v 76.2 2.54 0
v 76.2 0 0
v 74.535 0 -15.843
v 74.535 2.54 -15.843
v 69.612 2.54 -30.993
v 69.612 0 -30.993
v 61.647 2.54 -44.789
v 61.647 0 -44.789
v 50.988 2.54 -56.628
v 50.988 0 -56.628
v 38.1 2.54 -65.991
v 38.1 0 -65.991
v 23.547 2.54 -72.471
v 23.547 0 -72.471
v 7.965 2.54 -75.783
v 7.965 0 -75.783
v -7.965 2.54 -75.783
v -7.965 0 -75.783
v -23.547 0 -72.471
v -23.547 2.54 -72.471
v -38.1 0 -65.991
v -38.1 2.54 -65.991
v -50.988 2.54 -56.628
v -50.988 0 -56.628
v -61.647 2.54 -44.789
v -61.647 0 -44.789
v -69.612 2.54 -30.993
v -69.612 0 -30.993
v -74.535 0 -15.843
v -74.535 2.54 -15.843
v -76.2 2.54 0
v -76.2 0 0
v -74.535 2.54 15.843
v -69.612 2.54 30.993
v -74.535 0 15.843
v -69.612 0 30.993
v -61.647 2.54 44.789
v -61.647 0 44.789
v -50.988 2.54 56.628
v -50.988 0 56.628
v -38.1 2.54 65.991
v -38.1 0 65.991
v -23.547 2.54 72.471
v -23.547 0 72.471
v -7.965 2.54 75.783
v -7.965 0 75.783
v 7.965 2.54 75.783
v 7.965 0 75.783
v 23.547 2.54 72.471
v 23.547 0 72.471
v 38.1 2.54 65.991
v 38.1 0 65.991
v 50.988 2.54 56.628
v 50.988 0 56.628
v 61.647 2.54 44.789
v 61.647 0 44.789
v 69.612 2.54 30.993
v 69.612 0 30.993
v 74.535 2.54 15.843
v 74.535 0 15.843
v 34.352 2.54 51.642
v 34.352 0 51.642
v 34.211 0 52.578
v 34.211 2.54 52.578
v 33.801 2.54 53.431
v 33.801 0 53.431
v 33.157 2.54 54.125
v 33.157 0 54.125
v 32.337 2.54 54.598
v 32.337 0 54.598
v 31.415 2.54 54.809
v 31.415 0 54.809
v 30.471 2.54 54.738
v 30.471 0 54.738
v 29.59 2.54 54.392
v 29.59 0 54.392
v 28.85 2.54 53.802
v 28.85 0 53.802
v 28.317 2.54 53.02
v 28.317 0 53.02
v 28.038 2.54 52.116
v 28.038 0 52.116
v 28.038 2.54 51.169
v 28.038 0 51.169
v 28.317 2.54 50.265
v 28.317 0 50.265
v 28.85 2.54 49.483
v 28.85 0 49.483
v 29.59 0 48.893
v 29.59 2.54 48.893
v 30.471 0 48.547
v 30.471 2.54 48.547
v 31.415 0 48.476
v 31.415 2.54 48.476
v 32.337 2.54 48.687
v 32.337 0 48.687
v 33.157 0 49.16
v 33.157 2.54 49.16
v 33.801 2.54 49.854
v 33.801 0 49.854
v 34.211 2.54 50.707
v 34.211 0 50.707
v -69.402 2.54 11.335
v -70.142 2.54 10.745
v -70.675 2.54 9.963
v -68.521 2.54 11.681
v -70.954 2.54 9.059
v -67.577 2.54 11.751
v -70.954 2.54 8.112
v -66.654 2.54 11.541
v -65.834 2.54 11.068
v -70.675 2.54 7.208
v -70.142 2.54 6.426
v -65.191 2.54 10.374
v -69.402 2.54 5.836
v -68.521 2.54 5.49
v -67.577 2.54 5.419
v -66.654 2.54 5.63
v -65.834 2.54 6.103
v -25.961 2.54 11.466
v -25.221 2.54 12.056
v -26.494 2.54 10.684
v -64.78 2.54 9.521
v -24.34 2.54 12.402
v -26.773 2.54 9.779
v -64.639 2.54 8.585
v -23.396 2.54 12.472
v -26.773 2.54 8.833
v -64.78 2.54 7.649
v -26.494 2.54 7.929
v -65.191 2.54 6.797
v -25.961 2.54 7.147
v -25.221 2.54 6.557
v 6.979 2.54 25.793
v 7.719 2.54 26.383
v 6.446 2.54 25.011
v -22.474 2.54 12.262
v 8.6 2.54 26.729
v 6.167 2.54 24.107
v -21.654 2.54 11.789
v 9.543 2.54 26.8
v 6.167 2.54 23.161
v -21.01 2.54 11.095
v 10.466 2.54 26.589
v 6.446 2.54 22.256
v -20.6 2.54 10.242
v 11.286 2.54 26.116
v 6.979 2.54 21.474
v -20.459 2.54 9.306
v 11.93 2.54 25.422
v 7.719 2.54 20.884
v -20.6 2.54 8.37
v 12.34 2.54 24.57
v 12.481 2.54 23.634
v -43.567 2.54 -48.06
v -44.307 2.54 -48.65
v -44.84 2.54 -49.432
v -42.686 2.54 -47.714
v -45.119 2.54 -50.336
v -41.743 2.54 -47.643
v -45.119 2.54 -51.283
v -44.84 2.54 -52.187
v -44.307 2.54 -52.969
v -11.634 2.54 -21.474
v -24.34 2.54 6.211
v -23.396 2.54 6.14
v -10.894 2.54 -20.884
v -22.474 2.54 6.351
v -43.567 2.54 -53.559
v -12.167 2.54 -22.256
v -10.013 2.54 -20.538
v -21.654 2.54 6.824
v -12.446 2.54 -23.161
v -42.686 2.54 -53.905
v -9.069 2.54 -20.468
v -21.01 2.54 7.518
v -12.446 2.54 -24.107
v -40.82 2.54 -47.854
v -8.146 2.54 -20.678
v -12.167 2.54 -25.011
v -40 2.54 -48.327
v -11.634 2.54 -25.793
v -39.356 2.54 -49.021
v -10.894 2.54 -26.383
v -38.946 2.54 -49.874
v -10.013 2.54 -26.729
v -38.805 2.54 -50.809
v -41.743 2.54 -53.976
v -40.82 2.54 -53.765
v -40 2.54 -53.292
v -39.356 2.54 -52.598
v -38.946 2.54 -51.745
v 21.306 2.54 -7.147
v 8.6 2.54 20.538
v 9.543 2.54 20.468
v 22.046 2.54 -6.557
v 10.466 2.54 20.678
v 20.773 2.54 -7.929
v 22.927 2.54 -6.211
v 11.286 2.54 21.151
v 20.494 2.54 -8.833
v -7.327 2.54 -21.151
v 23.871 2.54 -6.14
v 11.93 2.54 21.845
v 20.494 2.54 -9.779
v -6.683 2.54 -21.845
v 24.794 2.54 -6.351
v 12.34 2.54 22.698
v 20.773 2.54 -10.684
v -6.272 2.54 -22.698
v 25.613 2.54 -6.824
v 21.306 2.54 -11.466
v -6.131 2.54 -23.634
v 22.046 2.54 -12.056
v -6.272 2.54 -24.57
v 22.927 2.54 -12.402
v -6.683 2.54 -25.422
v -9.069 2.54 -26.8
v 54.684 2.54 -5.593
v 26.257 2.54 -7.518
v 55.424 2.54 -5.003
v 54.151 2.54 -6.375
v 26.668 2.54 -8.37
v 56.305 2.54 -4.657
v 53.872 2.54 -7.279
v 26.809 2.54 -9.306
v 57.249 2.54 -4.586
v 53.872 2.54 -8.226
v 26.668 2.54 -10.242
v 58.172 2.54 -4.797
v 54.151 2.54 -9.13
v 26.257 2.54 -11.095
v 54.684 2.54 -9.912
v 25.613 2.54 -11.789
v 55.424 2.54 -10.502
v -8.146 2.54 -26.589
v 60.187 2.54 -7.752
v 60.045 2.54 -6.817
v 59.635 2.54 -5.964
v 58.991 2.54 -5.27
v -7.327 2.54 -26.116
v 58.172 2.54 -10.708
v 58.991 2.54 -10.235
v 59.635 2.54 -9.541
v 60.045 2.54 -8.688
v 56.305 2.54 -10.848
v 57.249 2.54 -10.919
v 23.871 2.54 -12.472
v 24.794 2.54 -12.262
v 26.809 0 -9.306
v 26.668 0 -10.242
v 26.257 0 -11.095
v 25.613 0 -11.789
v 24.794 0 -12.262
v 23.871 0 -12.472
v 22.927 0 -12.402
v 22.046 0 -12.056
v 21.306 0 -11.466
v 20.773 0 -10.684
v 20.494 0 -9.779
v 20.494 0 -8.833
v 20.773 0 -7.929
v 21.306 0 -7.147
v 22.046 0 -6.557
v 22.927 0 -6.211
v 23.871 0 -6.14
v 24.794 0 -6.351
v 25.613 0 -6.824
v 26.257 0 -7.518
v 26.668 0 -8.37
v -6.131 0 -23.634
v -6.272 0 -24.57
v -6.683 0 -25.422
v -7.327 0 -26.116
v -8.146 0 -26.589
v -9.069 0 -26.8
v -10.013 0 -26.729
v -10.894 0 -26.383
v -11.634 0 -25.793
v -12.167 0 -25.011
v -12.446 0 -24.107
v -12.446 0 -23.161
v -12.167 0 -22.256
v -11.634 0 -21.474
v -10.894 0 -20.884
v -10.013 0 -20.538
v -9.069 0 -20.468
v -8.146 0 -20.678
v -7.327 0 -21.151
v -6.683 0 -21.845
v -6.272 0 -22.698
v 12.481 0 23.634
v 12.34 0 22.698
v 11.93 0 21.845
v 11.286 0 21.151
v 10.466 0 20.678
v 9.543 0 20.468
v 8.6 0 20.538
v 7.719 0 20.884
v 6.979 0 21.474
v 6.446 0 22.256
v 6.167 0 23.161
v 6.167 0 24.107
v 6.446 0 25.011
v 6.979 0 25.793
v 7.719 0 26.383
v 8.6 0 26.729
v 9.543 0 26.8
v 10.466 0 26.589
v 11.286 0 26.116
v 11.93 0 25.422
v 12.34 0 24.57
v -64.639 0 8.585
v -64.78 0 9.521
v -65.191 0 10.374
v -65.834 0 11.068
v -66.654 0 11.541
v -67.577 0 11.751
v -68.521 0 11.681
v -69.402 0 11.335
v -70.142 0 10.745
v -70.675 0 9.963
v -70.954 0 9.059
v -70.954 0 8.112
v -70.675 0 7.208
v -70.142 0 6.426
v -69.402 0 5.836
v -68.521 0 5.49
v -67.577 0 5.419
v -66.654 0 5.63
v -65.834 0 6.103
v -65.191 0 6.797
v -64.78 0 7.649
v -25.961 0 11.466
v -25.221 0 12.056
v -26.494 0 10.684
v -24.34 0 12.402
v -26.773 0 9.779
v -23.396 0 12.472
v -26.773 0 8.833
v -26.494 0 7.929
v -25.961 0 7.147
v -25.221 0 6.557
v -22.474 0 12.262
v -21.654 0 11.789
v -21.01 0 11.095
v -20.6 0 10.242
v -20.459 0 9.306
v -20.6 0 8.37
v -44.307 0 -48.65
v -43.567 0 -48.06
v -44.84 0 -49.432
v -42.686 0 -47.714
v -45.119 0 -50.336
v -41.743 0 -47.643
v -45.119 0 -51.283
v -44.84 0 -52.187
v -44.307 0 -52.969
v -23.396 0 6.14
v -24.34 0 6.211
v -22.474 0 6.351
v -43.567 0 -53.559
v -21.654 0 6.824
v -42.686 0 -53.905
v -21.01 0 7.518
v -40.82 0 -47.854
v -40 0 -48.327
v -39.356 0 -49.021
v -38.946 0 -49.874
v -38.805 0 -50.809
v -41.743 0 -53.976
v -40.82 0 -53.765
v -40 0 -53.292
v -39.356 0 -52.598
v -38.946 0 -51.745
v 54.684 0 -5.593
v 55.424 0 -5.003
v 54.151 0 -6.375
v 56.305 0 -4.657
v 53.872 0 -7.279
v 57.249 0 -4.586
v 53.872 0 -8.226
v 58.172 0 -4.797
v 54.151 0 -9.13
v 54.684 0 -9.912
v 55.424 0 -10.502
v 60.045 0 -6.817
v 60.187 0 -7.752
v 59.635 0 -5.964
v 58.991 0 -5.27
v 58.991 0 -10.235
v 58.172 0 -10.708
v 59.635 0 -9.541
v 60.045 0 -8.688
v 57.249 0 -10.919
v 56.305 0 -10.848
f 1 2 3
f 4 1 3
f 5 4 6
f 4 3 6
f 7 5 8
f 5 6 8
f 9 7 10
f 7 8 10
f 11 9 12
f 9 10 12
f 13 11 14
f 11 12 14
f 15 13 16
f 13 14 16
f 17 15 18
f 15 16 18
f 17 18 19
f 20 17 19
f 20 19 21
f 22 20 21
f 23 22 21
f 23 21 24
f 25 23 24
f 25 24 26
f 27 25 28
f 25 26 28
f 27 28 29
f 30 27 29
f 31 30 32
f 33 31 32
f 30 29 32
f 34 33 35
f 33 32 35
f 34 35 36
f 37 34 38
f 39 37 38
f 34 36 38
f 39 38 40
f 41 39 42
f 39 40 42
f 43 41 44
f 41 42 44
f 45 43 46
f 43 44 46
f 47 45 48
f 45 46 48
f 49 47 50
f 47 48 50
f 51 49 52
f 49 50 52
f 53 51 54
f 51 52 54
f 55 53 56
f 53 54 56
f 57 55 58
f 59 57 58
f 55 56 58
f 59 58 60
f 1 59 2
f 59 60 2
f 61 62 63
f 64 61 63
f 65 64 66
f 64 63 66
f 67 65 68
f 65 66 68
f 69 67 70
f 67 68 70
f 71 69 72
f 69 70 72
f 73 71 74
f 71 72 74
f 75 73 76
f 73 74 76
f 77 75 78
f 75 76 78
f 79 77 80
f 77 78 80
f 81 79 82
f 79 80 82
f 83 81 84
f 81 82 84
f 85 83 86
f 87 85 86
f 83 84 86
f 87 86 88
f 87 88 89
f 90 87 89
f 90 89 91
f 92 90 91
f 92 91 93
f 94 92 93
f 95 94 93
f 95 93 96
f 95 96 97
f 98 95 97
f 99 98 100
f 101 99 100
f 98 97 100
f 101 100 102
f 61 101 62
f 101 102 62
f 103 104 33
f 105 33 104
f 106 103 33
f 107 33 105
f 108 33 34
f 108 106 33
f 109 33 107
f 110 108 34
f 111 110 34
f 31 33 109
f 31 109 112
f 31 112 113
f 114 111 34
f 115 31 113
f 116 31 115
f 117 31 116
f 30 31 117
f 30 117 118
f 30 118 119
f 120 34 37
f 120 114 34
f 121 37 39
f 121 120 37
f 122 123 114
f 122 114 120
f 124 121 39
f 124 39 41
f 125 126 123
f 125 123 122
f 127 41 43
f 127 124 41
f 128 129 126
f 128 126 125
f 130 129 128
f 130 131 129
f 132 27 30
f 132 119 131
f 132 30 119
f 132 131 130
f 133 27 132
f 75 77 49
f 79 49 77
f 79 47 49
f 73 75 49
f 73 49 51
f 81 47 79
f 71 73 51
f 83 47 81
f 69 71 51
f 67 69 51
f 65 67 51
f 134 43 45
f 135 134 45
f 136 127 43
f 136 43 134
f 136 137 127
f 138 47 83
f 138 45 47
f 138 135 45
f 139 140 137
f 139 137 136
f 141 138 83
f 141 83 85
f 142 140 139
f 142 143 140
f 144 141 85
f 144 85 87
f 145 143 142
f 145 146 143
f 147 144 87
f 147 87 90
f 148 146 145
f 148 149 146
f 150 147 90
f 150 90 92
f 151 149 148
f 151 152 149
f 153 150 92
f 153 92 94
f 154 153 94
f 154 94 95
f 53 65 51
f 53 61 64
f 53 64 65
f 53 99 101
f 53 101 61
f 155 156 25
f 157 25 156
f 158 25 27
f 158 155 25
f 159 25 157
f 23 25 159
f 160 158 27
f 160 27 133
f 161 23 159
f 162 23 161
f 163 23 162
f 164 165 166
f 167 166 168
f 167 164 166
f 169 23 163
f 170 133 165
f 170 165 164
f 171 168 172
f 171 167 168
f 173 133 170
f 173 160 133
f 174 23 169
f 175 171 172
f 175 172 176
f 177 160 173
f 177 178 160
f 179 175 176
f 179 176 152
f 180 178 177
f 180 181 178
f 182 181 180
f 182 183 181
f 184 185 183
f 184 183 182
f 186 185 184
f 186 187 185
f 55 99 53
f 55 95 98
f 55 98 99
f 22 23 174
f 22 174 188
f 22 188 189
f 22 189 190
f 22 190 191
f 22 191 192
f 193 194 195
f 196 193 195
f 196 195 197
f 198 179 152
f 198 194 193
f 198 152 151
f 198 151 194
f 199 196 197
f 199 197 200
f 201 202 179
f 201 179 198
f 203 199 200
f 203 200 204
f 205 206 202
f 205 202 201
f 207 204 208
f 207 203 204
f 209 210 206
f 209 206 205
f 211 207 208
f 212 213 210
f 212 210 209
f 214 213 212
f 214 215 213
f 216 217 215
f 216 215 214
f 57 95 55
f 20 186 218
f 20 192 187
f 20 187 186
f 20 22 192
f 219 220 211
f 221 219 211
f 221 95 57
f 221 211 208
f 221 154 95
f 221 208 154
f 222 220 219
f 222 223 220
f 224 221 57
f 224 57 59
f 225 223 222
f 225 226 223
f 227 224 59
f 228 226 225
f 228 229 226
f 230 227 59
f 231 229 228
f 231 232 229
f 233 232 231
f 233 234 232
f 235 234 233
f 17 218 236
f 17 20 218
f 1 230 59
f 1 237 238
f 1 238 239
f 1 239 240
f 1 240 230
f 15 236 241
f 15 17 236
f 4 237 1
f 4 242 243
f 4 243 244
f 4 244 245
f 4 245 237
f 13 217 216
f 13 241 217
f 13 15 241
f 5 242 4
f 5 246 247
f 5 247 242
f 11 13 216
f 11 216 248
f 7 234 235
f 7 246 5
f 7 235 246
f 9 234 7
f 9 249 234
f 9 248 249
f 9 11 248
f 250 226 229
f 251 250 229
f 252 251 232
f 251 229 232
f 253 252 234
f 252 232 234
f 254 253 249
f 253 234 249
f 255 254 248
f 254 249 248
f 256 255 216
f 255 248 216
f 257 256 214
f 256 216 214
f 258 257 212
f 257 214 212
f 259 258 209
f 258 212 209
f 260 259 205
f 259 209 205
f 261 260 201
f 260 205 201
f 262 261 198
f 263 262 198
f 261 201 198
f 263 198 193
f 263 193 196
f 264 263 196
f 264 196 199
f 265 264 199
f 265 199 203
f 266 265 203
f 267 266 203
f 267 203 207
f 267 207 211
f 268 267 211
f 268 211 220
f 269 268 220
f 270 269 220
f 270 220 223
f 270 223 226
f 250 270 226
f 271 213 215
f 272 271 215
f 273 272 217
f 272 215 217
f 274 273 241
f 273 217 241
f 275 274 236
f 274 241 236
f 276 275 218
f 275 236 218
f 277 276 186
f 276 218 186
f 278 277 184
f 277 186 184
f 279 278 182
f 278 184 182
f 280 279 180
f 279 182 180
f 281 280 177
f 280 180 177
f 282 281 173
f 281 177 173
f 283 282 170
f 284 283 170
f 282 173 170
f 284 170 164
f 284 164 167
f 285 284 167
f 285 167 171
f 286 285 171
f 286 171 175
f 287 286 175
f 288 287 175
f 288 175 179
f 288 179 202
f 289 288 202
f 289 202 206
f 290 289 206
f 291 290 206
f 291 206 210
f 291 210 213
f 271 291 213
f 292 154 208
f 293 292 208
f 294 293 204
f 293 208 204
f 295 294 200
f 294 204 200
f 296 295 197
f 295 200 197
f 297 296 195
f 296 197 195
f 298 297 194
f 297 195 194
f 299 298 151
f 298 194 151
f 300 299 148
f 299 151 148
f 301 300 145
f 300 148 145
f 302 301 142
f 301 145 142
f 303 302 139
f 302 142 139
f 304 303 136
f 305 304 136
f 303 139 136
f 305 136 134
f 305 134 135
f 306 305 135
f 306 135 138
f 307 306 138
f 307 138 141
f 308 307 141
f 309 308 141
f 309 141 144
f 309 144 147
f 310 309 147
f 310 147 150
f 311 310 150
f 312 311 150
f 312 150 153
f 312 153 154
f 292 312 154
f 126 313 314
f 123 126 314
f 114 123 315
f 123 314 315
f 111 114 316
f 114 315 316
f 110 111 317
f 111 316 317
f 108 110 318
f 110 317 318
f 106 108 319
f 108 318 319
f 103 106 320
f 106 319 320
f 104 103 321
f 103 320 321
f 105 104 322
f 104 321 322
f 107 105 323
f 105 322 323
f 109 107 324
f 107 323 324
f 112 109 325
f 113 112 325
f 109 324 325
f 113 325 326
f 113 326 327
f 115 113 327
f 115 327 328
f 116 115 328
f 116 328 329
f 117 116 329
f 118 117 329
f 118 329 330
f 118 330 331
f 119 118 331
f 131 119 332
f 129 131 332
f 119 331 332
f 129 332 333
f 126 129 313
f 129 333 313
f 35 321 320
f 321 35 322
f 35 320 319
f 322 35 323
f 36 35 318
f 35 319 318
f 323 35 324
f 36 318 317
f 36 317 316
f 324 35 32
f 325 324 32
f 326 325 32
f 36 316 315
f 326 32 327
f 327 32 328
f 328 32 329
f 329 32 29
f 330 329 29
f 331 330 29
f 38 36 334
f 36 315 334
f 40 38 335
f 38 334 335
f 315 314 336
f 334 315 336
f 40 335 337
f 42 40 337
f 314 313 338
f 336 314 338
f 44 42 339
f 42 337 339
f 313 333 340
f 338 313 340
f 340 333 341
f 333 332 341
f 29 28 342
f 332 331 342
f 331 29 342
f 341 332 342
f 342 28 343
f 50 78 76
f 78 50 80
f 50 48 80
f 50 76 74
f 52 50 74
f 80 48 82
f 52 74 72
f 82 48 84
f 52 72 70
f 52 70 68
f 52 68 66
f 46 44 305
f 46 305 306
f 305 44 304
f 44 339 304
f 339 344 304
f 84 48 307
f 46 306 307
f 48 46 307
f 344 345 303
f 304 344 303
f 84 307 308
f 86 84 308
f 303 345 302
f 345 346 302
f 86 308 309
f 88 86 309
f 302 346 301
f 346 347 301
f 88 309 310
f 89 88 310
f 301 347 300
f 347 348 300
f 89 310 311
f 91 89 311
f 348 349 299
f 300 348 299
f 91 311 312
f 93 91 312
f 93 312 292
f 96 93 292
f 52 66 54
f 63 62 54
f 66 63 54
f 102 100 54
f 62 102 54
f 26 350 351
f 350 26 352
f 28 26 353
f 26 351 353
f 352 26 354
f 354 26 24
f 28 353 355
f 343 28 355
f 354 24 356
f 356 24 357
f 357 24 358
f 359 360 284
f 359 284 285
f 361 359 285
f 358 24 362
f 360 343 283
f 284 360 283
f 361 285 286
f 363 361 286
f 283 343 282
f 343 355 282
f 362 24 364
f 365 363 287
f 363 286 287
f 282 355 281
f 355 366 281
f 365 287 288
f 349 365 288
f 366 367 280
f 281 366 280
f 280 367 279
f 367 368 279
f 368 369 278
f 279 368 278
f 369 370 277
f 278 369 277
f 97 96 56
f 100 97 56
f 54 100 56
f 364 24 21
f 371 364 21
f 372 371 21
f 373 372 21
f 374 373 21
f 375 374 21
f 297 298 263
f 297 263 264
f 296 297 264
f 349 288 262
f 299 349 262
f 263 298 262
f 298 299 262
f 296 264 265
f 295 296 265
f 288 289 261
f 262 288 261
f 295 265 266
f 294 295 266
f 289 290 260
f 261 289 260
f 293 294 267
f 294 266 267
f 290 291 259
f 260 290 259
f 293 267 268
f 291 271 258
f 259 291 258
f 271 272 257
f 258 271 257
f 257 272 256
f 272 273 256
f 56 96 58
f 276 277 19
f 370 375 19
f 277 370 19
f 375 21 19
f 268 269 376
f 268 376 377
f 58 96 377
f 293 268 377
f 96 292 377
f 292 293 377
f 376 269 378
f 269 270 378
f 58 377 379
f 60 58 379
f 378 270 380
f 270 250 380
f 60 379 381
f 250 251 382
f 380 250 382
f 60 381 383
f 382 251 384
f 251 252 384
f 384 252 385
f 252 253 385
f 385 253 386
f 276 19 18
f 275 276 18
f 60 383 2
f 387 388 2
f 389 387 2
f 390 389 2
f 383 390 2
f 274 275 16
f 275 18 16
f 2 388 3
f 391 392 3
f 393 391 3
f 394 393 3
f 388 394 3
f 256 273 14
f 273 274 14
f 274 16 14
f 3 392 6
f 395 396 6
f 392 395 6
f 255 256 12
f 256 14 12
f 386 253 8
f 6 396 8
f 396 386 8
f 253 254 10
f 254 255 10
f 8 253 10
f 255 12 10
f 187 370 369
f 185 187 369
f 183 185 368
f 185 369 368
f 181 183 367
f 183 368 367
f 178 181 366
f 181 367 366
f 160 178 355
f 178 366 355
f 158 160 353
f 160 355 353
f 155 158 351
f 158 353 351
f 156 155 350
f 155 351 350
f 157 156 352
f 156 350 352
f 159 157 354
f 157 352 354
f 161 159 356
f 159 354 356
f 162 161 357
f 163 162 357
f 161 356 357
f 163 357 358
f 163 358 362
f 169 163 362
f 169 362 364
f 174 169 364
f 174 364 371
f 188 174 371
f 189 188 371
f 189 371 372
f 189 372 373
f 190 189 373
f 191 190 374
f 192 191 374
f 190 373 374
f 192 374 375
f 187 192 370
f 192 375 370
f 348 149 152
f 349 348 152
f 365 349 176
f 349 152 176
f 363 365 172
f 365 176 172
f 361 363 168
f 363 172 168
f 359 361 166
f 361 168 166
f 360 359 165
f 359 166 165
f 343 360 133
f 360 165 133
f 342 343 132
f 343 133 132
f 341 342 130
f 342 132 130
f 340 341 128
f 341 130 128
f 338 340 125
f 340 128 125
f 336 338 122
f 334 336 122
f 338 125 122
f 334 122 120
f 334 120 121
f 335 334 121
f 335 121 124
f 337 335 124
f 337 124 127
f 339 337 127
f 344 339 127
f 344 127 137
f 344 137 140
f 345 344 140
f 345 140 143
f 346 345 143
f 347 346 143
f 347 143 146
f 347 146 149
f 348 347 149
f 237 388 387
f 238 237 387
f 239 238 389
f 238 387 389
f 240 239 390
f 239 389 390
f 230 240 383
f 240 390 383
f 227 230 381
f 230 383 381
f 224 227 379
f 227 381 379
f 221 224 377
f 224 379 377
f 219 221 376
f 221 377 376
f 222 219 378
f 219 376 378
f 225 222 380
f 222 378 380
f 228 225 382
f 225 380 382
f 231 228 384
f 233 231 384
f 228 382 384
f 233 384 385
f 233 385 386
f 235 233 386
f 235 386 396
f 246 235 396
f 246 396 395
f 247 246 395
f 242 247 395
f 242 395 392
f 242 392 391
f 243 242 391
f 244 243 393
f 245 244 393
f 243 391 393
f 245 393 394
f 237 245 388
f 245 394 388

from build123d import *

# Parameters (mm, degrees)
SKETCH1_R           = 76.2
BOSS_EXTRUDE1_DEPTH = 2.54
SKETCH2_R           = 3.175
CUT_EXTRUDE1_DEPTH  = 2.54
SKETCH4_R           = 3.175
CUT_EXTRUDE3_DEPTH  = 3.54


with BuildPart() as part:
    # Sketch1 → Boss-Extrude1 (new body)
    with BuildSketch(Plane(origin=(0, 0, 0), x_dir=(1, 0, 0), z_dir=(0, 1, 0))):
        Circle(SKETCH1_R)
    extrude(amount=BOSS_EXTRUDE1_DEPTH)

    # Sketch2 → Cut-Extrude1 (cut)
    with BuildSketch(Plane.XZ):
        with Locations((-67.814061825, 8.585318756)):
            Circle(SKETCH2_R)
        with Locations((-41.97979671, -50.809492852)):
            Circle(SKETCH2_R)
        with Locations((57.01155597, -7.752384327)):
            Circle(SKETCH2_R)
        with Locations((31.177290855, 51.642427281)):
            Circle(SKETCH2_R)
    extrude(amount=-CUT_EXTRUDE1_DEPTH, mode=Mode.SUBTRACT)

    # Sketch4 → Cut-Extrude3 (cut, through all)
    with BuildSketch(Plane(origin=(0, 2.54, 0), x_dir=(1, 0, 0), z_dir=(0, 1, 0))):
        with Locations((-9.306231375, 23.633748277)):
            Circle(SKETCH4_R)
        with Locations((23.633748277, 9.306231375)):
            Circle(SKETCH4_R)
        with Locations((9.306231375, -23.633748277)):
            Circle(SKETCH4_R)
        with Locations((-23.633748277, -9.306231375)):
            Circle(SKETCH4_R)
    extrude(amount=-CUT_EXTRUDE3_DEPTH, mode=Mode.SUBTRACT)


solid = part.part
